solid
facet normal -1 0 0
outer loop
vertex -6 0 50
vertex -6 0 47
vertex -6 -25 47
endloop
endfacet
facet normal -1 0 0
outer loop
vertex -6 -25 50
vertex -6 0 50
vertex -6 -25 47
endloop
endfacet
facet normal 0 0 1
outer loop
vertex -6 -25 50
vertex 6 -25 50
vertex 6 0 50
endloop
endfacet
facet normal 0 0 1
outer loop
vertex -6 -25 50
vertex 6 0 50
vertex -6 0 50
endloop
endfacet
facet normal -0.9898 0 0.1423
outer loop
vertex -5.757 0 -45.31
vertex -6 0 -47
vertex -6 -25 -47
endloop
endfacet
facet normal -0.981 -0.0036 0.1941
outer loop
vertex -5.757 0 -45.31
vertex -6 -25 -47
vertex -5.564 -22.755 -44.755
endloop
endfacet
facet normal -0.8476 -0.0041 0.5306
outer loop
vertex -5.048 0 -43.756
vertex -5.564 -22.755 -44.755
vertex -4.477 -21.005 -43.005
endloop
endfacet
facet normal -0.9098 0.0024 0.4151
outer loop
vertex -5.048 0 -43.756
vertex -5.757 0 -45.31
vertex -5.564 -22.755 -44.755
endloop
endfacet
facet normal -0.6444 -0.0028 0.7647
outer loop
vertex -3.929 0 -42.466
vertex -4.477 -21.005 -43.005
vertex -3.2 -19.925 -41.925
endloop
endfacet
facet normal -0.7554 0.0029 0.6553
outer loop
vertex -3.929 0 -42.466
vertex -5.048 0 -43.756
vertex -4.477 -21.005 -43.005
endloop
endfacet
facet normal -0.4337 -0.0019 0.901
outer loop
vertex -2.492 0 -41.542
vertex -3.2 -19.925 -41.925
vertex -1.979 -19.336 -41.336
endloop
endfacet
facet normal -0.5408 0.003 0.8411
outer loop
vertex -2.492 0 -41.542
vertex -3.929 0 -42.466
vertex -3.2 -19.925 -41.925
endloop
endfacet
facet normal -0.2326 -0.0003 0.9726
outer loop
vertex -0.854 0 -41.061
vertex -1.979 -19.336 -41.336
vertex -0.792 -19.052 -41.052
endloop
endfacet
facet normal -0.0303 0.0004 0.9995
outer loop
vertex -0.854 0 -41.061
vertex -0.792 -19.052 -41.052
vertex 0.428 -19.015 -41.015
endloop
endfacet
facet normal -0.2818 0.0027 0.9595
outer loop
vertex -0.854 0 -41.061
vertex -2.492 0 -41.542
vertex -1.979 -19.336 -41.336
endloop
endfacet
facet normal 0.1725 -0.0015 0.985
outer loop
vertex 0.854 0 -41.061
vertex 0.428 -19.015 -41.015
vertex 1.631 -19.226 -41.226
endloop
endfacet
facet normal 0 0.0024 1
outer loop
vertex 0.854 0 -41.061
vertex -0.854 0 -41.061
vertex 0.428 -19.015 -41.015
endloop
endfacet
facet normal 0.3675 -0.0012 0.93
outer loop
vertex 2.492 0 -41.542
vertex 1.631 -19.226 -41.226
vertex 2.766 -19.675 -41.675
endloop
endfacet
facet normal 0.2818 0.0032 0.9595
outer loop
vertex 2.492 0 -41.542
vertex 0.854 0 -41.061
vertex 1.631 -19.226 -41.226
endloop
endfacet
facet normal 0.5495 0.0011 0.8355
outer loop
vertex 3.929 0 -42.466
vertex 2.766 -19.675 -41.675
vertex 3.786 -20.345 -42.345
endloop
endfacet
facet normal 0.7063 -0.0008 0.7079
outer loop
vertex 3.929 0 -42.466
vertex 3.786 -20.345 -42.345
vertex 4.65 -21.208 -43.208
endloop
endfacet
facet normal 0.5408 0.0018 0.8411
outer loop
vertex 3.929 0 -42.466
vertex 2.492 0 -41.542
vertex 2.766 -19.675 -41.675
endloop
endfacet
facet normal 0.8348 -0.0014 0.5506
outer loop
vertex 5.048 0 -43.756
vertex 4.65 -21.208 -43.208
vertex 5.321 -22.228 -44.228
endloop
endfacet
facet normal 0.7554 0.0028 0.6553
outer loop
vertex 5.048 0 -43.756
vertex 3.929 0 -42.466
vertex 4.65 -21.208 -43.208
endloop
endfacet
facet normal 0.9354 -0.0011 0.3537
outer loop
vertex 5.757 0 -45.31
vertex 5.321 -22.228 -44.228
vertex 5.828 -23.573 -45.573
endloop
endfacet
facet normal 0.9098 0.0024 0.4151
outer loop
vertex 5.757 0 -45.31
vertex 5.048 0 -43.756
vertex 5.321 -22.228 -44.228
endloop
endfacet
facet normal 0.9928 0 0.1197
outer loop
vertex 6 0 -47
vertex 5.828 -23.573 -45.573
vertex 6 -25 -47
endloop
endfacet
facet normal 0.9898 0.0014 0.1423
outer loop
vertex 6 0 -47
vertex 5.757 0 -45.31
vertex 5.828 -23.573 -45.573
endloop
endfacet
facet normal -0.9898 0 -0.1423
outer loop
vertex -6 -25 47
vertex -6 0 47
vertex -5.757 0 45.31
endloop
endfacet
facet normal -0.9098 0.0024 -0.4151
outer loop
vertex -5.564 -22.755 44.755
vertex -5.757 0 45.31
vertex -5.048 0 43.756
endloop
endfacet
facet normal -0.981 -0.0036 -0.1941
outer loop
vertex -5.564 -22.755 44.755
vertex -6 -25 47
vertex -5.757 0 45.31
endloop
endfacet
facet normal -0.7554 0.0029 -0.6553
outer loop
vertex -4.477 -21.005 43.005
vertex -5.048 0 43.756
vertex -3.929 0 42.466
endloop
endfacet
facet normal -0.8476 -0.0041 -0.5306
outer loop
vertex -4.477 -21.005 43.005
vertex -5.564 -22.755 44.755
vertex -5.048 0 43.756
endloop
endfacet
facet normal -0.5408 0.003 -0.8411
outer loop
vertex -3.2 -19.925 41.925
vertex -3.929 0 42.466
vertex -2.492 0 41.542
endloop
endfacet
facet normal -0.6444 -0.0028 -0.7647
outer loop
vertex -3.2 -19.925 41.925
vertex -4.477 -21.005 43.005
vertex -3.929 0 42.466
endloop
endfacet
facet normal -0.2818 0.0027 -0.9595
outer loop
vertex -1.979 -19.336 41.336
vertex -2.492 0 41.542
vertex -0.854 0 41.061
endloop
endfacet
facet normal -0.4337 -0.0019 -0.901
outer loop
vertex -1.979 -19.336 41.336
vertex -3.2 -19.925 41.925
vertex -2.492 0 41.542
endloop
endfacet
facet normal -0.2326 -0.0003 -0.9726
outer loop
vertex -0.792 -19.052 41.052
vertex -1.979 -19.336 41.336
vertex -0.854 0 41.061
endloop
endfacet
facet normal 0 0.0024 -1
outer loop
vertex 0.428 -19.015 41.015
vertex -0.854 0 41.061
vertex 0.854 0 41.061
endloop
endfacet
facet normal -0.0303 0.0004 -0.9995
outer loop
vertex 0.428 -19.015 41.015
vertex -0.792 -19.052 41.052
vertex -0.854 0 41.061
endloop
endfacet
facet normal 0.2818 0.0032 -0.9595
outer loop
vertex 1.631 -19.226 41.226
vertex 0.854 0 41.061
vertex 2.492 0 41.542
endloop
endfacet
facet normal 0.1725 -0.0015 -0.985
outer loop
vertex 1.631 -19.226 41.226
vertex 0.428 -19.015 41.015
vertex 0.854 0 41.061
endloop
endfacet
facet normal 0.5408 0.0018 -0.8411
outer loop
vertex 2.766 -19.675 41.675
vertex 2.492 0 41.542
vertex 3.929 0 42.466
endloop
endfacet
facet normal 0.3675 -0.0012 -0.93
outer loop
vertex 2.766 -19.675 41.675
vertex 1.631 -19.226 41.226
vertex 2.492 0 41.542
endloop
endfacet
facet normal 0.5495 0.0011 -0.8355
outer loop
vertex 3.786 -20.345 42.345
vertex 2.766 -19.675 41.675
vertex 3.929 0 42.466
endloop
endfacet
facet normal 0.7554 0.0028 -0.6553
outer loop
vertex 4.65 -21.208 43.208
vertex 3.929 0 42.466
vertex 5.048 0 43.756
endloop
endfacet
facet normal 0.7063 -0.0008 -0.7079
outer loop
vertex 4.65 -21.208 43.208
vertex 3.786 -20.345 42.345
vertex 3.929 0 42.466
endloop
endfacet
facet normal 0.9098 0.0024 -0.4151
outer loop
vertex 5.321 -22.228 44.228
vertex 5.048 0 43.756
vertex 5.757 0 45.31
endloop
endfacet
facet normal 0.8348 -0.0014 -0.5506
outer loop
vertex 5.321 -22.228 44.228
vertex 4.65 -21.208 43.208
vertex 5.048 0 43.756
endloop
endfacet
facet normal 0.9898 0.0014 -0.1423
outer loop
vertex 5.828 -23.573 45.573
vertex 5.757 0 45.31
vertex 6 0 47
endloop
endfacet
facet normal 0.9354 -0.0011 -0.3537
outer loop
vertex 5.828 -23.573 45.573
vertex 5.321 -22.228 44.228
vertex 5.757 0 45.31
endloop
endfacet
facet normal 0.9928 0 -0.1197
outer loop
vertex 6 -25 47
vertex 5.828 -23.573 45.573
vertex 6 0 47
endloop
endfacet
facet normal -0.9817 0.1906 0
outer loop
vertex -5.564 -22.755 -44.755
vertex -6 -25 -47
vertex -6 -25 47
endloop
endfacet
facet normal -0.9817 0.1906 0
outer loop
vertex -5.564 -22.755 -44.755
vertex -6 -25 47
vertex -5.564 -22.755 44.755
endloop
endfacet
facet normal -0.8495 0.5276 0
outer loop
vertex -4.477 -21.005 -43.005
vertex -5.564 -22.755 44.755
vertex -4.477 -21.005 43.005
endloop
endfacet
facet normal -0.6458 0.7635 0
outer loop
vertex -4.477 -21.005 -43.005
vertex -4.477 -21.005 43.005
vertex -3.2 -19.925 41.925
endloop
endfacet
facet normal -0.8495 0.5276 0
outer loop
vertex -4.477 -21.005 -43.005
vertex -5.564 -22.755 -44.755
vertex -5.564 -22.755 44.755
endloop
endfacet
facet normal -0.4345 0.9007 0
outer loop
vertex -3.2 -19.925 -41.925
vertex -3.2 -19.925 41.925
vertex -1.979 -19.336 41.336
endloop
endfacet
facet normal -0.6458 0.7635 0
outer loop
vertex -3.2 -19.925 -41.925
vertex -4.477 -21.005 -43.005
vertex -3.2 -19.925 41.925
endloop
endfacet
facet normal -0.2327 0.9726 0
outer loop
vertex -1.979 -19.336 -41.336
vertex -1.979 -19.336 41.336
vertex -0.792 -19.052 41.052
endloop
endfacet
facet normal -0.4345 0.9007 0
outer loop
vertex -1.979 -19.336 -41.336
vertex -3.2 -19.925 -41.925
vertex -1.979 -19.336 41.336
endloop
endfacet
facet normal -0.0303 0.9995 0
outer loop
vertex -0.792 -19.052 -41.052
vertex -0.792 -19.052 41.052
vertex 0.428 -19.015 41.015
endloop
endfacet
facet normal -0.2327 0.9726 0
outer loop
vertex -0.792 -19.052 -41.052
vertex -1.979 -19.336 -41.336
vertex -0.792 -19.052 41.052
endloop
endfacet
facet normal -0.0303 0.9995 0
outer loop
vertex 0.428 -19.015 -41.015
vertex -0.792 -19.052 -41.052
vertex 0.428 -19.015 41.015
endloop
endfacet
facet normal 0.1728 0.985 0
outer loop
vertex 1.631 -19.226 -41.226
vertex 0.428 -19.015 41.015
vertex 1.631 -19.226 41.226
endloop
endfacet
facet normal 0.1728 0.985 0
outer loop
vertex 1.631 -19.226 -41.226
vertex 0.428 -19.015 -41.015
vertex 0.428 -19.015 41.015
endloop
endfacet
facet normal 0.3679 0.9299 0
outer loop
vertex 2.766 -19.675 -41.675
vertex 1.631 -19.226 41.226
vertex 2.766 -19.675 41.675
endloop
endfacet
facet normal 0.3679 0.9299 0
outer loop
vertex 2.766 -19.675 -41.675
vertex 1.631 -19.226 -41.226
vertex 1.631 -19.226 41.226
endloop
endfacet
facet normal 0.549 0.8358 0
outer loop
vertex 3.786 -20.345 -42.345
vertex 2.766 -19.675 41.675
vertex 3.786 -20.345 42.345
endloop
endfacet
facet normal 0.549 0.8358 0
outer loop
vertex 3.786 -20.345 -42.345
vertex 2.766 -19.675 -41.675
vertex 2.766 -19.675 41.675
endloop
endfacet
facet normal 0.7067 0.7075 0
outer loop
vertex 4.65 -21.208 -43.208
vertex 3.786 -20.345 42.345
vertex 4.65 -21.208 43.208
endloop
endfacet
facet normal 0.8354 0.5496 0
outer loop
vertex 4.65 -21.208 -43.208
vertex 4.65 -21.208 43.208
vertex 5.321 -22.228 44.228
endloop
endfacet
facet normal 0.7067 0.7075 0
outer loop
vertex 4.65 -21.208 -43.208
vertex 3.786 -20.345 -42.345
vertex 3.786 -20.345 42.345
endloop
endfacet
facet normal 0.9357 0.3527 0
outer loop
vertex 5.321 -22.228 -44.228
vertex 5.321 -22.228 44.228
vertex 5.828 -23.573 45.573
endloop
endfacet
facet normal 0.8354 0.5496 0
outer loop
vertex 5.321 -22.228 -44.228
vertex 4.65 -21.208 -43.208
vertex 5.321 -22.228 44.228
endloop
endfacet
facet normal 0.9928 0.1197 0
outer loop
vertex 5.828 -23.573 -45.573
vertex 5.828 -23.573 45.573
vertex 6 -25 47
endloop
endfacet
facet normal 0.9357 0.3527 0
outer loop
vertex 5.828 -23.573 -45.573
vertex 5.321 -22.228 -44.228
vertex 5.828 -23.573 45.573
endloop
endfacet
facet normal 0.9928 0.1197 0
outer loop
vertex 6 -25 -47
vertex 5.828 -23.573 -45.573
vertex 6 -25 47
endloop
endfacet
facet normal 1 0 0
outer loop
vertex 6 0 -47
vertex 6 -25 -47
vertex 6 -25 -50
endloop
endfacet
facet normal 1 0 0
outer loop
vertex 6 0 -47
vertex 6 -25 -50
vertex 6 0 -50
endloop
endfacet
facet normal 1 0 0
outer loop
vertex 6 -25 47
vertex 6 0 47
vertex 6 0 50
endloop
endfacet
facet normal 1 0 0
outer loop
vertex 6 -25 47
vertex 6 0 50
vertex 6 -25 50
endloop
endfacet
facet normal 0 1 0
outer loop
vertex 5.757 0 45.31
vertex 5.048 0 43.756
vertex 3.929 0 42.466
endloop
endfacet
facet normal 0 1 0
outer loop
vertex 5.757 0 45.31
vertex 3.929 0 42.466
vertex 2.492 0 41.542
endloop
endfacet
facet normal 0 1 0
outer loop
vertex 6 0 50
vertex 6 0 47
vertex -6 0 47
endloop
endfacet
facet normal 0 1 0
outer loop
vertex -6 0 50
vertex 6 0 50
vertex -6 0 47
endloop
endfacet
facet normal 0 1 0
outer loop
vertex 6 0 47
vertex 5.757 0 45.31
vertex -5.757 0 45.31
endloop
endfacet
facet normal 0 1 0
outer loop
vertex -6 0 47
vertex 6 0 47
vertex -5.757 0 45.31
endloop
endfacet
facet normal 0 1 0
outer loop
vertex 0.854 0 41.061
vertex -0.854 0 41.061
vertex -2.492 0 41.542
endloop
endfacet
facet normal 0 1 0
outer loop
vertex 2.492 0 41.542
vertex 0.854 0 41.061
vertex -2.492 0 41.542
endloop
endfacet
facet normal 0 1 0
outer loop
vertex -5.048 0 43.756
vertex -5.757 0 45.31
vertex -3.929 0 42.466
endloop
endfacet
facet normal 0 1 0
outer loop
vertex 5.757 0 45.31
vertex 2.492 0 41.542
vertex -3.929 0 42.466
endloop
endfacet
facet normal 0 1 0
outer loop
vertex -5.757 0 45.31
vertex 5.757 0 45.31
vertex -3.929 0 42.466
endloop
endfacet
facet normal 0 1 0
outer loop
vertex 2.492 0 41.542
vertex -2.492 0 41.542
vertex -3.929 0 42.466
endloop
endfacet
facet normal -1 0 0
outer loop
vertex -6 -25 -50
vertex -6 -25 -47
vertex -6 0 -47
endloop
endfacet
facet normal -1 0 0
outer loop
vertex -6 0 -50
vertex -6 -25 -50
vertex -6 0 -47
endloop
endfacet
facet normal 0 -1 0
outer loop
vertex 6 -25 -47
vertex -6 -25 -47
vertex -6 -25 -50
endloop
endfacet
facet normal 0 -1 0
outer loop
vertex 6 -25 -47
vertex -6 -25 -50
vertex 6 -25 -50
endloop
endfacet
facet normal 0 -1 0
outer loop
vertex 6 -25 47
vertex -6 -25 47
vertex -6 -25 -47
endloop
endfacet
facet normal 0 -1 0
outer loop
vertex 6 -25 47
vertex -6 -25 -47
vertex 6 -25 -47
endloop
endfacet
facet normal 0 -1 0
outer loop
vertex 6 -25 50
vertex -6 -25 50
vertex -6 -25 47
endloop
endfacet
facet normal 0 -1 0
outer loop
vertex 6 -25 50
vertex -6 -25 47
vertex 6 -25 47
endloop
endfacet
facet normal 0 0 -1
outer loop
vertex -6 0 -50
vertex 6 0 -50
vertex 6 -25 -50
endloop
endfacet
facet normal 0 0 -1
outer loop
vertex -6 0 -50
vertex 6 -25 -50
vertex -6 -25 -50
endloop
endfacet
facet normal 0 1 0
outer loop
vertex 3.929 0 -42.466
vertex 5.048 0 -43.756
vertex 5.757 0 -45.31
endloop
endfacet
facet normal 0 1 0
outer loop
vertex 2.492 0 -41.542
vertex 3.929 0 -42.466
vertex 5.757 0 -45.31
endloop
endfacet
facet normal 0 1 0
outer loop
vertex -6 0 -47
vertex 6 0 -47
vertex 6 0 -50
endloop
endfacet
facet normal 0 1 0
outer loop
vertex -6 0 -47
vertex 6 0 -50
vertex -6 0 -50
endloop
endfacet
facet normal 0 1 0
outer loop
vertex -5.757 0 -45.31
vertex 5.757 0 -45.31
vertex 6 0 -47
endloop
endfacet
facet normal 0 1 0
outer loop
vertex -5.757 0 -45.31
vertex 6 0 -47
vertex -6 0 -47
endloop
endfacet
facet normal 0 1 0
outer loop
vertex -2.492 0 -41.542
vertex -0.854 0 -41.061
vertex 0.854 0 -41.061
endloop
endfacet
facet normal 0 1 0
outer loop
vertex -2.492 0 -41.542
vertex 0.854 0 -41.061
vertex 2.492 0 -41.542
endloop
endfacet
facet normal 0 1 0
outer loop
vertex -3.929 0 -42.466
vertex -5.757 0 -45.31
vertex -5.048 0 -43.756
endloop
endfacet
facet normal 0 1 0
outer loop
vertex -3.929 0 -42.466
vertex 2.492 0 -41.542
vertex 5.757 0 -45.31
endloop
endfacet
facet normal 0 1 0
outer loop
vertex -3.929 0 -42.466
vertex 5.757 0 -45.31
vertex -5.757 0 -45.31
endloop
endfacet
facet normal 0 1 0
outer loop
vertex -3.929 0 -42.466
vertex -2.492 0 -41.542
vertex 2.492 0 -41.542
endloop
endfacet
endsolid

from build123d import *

# Parameters (mm, degrees)
F3_DEPTH = 3
F4_DEPTH = 3


with BuildPart() as f2:
    # F2: sweep along a path in F0
    with BuildLine(Plane.YZ) as f2_path:
        Line((0, 47), (-25, 47))
        Line((-25, 47), (-25, -47))
        Line((-25, -47), (0, -47))
    # F1 (on Front) → F2 (sweep)
    with BuildSketch(Plane.XZ):
        with BuildLine():
            Line((6, 47), (-6, 47))
            ThreePointArc((-6, 47), (0, 41), (6, 47))
        make_face()
    sweep(path=f2_path.line, transition=Transition.RIGHT)

    # F3 (add): a face of the model
    f3_faces = [f2.faces().sort_by_distance(p)[0] for p in [
        (0, -12.5, 47),
    ]]
    extrude(f3_faces, amount=F3_DEPTH)

    # F4 (add): a face of the model
    f4_faces = [f2.faces().sort_by_distance(p)[0] for p in [
        (0, -12.5, -47),
    ]]
    extrude(f4_faces, amount=F4_DEPTH)


solid = f2.part
